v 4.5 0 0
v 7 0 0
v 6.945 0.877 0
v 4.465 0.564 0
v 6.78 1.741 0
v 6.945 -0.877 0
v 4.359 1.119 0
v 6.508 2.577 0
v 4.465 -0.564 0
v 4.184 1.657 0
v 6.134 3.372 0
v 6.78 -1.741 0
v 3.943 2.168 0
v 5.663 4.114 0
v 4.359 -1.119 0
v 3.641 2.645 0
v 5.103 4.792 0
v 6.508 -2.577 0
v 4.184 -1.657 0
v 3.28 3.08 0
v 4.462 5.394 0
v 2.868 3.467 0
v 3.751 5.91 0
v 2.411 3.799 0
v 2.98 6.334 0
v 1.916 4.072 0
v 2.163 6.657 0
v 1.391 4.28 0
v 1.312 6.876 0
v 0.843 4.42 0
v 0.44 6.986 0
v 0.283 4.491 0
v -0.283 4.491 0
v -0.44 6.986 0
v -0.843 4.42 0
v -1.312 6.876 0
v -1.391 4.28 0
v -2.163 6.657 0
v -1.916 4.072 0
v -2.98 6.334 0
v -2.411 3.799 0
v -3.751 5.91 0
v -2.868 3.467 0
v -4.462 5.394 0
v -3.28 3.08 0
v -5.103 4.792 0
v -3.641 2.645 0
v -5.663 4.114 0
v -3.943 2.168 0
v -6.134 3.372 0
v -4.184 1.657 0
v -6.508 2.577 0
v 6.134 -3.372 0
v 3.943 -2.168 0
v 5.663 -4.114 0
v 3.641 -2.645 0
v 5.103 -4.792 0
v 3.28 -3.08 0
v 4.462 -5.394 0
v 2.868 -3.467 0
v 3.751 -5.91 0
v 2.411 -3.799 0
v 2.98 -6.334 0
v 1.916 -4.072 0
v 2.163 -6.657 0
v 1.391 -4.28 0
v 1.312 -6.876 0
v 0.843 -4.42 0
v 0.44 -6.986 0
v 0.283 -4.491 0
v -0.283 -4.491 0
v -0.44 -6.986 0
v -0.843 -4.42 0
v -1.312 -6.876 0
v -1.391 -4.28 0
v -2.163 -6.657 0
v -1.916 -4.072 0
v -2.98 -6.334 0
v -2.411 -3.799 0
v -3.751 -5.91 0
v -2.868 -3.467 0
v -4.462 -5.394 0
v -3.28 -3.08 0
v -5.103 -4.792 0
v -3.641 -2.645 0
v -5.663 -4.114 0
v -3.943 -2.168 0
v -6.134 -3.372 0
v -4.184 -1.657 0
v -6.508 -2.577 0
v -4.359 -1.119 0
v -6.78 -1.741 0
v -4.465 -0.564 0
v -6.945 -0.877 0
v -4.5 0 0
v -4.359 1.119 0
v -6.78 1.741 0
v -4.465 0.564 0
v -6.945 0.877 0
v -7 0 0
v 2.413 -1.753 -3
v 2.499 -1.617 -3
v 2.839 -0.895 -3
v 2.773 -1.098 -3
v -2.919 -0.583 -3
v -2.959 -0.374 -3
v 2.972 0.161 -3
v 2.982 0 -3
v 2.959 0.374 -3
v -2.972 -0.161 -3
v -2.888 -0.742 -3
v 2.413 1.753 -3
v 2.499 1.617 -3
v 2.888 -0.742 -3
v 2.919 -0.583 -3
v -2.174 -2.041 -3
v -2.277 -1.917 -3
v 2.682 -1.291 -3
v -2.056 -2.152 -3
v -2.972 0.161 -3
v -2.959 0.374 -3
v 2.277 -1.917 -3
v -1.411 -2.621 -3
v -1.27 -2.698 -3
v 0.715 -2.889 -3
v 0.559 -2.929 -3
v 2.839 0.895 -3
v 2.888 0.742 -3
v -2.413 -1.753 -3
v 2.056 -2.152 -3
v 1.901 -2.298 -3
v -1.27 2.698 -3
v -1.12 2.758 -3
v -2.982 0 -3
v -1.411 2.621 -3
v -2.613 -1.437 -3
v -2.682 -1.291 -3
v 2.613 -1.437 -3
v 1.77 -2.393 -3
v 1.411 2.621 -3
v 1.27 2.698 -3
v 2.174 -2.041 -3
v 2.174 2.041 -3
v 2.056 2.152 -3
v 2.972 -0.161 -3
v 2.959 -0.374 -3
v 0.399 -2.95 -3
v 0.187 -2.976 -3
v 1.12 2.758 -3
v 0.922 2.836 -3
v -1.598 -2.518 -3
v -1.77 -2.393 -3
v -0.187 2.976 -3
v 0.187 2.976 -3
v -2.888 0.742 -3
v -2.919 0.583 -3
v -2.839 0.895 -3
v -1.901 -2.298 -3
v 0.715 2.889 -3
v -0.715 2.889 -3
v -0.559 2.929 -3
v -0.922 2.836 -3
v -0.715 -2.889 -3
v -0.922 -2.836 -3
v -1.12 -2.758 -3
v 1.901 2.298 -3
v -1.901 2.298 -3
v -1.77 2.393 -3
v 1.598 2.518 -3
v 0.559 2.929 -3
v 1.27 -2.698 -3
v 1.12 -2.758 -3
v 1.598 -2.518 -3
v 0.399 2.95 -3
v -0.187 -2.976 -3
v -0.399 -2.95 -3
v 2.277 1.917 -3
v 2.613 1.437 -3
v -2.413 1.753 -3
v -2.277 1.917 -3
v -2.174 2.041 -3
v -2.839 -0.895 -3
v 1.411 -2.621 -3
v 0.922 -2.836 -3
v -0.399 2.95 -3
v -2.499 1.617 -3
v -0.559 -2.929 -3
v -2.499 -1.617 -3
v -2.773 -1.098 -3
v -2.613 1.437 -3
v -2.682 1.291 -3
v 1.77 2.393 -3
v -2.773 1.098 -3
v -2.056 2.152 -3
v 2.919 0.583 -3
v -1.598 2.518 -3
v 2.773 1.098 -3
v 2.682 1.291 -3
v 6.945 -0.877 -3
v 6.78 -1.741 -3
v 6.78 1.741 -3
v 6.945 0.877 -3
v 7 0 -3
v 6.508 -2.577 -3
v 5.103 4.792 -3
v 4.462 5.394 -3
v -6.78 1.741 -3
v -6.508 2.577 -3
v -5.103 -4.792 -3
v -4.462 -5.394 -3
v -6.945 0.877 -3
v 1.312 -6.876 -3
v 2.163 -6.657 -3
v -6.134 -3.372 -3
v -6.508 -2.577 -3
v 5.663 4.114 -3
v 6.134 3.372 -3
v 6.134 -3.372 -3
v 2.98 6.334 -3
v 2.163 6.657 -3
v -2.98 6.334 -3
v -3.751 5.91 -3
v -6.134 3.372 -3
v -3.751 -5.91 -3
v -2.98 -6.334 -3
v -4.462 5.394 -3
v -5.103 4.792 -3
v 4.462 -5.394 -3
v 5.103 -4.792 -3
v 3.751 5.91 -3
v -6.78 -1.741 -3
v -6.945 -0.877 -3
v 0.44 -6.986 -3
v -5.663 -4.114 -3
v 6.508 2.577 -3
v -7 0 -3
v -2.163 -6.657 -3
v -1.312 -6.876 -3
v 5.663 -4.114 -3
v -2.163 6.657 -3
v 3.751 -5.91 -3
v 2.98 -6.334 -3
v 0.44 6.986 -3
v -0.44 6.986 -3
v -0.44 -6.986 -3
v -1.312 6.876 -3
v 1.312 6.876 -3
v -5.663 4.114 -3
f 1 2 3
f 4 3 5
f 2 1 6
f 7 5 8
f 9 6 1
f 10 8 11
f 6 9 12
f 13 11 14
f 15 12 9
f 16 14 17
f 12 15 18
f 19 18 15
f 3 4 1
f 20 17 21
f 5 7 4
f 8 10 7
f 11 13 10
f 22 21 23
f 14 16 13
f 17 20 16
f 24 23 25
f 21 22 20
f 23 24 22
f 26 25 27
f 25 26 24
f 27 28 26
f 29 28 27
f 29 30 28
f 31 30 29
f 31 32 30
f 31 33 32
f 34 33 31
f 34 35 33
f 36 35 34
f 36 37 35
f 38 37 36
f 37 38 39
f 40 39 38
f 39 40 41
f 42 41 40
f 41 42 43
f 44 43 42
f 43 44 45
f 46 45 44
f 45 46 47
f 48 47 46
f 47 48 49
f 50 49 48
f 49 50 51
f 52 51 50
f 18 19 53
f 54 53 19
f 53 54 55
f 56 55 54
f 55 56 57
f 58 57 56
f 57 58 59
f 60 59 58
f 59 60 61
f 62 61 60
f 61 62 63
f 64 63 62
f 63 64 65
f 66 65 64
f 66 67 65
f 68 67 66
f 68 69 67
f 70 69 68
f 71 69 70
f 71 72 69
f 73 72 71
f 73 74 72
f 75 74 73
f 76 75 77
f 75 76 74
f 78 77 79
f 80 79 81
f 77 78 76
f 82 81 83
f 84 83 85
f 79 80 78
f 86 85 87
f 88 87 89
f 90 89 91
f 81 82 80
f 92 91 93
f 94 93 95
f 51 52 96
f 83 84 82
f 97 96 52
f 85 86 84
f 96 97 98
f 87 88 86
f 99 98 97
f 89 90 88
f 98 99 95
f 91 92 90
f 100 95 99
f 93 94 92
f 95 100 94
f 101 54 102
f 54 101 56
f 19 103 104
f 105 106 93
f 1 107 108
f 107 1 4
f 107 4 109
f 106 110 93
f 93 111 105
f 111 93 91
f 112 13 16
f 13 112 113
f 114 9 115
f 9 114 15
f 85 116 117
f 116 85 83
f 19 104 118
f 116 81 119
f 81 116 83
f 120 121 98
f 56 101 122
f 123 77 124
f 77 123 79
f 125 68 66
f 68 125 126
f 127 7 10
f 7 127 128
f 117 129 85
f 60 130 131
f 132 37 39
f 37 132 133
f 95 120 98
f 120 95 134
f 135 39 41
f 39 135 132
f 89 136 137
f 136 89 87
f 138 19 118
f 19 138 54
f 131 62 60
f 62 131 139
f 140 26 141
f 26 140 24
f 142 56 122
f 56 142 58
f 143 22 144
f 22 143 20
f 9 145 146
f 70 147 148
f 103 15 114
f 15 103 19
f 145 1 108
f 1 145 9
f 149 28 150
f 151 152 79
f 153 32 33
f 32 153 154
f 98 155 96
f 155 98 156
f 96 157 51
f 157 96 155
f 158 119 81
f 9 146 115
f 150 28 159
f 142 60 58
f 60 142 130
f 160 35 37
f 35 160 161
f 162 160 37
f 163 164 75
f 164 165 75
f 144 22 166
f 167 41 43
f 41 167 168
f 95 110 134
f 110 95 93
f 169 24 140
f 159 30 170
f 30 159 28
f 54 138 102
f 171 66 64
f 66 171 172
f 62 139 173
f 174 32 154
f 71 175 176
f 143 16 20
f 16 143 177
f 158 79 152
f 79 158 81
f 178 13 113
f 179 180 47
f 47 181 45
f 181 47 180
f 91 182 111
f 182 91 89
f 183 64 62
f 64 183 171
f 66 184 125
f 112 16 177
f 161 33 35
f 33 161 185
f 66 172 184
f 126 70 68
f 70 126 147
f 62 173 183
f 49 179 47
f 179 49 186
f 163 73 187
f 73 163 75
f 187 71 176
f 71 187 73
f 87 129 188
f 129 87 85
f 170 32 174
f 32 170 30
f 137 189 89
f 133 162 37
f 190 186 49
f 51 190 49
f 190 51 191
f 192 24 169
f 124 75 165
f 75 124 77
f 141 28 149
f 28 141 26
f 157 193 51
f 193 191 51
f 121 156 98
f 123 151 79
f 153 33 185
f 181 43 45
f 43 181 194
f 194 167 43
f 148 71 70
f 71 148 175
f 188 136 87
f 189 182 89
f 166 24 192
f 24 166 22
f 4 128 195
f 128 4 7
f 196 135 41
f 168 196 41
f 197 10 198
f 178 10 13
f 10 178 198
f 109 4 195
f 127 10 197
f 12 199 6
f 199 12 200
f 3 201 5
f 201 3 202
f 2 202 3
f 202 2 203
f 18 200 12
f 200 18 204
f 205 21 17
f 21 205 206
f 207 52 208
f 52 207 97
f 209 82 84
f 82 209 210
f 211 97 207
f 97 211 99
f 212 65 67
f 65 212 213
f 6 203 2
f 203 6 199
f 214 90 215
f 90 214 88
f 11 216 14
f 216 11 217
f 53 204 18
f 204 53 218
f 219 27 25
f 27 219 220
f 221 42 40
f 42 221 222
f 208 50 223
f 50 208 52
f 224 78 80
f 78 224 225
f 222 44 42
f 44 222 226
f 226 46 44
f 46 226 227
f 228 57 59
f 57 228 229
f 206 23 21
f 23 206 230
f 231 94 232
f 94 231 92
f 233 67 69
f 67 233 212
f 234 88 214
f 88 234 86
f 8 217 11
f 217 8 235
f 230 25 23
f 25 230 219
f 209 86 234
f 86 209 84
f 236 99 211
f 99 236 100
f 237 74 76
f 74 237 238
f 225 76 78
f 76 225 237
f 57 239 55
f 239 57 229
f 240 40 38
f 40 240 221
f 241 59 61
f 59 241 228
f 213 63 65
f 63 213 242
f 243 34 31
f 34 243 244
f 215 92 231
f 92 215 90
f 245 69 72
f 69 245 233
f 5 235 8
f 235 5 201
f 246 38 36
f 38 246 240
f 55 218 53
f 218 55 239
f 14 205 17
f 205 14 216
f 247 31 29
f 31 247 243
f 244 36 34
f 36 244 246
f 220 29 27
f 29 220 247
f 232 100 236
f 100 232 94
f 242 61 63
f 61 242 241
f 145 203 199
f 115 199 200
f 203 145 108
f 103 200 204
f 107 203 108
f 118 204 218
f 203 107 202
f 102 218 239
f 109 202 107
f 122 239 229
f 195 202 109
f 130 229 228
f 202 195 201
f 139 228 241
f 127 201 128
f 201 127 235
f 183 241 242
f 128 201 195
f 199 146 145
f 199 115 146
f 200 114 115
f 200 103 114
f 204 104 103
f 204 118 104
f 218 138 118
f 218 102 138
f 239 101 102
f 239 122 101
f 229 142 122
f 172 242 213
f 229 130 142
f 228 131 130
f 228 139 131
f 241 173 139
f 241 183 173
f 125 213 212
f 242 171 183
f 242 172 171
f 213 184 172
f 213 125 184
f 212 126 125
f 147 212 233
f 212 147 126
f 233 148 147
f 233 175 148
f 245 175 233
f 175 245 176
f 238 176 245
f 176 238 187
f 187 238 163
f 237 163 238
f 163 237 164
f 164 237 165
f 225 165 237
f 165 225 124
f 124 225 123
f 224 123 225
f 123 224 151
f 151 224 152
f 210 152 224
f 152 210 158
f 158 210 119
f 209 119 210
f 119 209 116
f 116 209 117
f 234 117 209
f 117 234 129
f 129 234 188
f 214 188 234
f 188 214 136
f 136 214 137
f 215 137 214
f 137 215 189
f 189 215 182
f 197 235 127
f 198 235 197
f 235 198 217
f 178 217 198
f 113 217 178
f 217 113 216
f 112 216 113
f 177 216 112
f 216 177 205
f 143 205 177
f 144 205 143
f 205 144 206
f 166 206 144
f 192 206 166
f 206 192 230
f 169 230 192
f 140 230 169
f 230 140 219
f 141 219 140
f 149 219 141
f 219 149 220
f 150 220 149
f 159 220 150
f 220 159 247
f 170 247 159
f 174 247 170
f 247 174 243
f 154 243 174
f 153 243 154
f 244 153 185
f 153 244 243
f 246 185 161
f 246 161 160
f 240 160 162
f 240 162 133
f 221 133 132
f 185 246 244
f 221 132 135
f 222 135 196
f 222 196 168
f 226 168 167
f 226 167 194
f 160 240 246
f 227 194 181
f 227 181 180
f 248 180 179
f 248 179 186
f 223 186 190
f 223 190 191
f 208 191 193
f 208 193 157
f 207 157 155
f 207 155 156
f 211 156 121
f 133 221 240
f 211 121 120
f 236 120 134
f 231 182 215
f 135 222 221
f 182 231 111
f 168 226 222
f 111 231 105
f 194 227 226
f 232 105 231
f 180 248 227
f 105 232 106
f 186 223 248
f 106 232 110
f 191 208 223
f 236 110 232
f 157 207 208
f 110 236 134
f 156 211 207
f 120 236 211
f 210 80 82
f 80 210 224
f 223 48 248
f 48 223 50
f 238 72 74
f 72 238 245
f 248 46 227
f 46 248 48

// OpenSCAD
$fn = 50;

difference() {
	union() {
		translate(v = [0, 0, -3.0]) {
			cylinder(h = 3, r = 7.0);
		}
	}
	union() {
		translate(v = [0, 0, 0]) {
			rotate(a = [0, 0, 0]) {
				difference() {
					union() {
						translate(v = [0, 0, -6.0]) {
							cylinder(h = 6, r = 2.25);
						}
						translate(v = [0, 0, -4.2]) {
							cylinder(h = 4.2, r1 = 2.375, r2 = 4.5);
						}
						translate(v = [0, 0, -6.0]) {
							cylinder(h = 6, r = 2.375);
						}
						translate(v = [0, 0, -6.0]) {
							cylinder(h = 6, r = 2.25);
						}
					}
					union();
				}
			}
		}
	}
}
